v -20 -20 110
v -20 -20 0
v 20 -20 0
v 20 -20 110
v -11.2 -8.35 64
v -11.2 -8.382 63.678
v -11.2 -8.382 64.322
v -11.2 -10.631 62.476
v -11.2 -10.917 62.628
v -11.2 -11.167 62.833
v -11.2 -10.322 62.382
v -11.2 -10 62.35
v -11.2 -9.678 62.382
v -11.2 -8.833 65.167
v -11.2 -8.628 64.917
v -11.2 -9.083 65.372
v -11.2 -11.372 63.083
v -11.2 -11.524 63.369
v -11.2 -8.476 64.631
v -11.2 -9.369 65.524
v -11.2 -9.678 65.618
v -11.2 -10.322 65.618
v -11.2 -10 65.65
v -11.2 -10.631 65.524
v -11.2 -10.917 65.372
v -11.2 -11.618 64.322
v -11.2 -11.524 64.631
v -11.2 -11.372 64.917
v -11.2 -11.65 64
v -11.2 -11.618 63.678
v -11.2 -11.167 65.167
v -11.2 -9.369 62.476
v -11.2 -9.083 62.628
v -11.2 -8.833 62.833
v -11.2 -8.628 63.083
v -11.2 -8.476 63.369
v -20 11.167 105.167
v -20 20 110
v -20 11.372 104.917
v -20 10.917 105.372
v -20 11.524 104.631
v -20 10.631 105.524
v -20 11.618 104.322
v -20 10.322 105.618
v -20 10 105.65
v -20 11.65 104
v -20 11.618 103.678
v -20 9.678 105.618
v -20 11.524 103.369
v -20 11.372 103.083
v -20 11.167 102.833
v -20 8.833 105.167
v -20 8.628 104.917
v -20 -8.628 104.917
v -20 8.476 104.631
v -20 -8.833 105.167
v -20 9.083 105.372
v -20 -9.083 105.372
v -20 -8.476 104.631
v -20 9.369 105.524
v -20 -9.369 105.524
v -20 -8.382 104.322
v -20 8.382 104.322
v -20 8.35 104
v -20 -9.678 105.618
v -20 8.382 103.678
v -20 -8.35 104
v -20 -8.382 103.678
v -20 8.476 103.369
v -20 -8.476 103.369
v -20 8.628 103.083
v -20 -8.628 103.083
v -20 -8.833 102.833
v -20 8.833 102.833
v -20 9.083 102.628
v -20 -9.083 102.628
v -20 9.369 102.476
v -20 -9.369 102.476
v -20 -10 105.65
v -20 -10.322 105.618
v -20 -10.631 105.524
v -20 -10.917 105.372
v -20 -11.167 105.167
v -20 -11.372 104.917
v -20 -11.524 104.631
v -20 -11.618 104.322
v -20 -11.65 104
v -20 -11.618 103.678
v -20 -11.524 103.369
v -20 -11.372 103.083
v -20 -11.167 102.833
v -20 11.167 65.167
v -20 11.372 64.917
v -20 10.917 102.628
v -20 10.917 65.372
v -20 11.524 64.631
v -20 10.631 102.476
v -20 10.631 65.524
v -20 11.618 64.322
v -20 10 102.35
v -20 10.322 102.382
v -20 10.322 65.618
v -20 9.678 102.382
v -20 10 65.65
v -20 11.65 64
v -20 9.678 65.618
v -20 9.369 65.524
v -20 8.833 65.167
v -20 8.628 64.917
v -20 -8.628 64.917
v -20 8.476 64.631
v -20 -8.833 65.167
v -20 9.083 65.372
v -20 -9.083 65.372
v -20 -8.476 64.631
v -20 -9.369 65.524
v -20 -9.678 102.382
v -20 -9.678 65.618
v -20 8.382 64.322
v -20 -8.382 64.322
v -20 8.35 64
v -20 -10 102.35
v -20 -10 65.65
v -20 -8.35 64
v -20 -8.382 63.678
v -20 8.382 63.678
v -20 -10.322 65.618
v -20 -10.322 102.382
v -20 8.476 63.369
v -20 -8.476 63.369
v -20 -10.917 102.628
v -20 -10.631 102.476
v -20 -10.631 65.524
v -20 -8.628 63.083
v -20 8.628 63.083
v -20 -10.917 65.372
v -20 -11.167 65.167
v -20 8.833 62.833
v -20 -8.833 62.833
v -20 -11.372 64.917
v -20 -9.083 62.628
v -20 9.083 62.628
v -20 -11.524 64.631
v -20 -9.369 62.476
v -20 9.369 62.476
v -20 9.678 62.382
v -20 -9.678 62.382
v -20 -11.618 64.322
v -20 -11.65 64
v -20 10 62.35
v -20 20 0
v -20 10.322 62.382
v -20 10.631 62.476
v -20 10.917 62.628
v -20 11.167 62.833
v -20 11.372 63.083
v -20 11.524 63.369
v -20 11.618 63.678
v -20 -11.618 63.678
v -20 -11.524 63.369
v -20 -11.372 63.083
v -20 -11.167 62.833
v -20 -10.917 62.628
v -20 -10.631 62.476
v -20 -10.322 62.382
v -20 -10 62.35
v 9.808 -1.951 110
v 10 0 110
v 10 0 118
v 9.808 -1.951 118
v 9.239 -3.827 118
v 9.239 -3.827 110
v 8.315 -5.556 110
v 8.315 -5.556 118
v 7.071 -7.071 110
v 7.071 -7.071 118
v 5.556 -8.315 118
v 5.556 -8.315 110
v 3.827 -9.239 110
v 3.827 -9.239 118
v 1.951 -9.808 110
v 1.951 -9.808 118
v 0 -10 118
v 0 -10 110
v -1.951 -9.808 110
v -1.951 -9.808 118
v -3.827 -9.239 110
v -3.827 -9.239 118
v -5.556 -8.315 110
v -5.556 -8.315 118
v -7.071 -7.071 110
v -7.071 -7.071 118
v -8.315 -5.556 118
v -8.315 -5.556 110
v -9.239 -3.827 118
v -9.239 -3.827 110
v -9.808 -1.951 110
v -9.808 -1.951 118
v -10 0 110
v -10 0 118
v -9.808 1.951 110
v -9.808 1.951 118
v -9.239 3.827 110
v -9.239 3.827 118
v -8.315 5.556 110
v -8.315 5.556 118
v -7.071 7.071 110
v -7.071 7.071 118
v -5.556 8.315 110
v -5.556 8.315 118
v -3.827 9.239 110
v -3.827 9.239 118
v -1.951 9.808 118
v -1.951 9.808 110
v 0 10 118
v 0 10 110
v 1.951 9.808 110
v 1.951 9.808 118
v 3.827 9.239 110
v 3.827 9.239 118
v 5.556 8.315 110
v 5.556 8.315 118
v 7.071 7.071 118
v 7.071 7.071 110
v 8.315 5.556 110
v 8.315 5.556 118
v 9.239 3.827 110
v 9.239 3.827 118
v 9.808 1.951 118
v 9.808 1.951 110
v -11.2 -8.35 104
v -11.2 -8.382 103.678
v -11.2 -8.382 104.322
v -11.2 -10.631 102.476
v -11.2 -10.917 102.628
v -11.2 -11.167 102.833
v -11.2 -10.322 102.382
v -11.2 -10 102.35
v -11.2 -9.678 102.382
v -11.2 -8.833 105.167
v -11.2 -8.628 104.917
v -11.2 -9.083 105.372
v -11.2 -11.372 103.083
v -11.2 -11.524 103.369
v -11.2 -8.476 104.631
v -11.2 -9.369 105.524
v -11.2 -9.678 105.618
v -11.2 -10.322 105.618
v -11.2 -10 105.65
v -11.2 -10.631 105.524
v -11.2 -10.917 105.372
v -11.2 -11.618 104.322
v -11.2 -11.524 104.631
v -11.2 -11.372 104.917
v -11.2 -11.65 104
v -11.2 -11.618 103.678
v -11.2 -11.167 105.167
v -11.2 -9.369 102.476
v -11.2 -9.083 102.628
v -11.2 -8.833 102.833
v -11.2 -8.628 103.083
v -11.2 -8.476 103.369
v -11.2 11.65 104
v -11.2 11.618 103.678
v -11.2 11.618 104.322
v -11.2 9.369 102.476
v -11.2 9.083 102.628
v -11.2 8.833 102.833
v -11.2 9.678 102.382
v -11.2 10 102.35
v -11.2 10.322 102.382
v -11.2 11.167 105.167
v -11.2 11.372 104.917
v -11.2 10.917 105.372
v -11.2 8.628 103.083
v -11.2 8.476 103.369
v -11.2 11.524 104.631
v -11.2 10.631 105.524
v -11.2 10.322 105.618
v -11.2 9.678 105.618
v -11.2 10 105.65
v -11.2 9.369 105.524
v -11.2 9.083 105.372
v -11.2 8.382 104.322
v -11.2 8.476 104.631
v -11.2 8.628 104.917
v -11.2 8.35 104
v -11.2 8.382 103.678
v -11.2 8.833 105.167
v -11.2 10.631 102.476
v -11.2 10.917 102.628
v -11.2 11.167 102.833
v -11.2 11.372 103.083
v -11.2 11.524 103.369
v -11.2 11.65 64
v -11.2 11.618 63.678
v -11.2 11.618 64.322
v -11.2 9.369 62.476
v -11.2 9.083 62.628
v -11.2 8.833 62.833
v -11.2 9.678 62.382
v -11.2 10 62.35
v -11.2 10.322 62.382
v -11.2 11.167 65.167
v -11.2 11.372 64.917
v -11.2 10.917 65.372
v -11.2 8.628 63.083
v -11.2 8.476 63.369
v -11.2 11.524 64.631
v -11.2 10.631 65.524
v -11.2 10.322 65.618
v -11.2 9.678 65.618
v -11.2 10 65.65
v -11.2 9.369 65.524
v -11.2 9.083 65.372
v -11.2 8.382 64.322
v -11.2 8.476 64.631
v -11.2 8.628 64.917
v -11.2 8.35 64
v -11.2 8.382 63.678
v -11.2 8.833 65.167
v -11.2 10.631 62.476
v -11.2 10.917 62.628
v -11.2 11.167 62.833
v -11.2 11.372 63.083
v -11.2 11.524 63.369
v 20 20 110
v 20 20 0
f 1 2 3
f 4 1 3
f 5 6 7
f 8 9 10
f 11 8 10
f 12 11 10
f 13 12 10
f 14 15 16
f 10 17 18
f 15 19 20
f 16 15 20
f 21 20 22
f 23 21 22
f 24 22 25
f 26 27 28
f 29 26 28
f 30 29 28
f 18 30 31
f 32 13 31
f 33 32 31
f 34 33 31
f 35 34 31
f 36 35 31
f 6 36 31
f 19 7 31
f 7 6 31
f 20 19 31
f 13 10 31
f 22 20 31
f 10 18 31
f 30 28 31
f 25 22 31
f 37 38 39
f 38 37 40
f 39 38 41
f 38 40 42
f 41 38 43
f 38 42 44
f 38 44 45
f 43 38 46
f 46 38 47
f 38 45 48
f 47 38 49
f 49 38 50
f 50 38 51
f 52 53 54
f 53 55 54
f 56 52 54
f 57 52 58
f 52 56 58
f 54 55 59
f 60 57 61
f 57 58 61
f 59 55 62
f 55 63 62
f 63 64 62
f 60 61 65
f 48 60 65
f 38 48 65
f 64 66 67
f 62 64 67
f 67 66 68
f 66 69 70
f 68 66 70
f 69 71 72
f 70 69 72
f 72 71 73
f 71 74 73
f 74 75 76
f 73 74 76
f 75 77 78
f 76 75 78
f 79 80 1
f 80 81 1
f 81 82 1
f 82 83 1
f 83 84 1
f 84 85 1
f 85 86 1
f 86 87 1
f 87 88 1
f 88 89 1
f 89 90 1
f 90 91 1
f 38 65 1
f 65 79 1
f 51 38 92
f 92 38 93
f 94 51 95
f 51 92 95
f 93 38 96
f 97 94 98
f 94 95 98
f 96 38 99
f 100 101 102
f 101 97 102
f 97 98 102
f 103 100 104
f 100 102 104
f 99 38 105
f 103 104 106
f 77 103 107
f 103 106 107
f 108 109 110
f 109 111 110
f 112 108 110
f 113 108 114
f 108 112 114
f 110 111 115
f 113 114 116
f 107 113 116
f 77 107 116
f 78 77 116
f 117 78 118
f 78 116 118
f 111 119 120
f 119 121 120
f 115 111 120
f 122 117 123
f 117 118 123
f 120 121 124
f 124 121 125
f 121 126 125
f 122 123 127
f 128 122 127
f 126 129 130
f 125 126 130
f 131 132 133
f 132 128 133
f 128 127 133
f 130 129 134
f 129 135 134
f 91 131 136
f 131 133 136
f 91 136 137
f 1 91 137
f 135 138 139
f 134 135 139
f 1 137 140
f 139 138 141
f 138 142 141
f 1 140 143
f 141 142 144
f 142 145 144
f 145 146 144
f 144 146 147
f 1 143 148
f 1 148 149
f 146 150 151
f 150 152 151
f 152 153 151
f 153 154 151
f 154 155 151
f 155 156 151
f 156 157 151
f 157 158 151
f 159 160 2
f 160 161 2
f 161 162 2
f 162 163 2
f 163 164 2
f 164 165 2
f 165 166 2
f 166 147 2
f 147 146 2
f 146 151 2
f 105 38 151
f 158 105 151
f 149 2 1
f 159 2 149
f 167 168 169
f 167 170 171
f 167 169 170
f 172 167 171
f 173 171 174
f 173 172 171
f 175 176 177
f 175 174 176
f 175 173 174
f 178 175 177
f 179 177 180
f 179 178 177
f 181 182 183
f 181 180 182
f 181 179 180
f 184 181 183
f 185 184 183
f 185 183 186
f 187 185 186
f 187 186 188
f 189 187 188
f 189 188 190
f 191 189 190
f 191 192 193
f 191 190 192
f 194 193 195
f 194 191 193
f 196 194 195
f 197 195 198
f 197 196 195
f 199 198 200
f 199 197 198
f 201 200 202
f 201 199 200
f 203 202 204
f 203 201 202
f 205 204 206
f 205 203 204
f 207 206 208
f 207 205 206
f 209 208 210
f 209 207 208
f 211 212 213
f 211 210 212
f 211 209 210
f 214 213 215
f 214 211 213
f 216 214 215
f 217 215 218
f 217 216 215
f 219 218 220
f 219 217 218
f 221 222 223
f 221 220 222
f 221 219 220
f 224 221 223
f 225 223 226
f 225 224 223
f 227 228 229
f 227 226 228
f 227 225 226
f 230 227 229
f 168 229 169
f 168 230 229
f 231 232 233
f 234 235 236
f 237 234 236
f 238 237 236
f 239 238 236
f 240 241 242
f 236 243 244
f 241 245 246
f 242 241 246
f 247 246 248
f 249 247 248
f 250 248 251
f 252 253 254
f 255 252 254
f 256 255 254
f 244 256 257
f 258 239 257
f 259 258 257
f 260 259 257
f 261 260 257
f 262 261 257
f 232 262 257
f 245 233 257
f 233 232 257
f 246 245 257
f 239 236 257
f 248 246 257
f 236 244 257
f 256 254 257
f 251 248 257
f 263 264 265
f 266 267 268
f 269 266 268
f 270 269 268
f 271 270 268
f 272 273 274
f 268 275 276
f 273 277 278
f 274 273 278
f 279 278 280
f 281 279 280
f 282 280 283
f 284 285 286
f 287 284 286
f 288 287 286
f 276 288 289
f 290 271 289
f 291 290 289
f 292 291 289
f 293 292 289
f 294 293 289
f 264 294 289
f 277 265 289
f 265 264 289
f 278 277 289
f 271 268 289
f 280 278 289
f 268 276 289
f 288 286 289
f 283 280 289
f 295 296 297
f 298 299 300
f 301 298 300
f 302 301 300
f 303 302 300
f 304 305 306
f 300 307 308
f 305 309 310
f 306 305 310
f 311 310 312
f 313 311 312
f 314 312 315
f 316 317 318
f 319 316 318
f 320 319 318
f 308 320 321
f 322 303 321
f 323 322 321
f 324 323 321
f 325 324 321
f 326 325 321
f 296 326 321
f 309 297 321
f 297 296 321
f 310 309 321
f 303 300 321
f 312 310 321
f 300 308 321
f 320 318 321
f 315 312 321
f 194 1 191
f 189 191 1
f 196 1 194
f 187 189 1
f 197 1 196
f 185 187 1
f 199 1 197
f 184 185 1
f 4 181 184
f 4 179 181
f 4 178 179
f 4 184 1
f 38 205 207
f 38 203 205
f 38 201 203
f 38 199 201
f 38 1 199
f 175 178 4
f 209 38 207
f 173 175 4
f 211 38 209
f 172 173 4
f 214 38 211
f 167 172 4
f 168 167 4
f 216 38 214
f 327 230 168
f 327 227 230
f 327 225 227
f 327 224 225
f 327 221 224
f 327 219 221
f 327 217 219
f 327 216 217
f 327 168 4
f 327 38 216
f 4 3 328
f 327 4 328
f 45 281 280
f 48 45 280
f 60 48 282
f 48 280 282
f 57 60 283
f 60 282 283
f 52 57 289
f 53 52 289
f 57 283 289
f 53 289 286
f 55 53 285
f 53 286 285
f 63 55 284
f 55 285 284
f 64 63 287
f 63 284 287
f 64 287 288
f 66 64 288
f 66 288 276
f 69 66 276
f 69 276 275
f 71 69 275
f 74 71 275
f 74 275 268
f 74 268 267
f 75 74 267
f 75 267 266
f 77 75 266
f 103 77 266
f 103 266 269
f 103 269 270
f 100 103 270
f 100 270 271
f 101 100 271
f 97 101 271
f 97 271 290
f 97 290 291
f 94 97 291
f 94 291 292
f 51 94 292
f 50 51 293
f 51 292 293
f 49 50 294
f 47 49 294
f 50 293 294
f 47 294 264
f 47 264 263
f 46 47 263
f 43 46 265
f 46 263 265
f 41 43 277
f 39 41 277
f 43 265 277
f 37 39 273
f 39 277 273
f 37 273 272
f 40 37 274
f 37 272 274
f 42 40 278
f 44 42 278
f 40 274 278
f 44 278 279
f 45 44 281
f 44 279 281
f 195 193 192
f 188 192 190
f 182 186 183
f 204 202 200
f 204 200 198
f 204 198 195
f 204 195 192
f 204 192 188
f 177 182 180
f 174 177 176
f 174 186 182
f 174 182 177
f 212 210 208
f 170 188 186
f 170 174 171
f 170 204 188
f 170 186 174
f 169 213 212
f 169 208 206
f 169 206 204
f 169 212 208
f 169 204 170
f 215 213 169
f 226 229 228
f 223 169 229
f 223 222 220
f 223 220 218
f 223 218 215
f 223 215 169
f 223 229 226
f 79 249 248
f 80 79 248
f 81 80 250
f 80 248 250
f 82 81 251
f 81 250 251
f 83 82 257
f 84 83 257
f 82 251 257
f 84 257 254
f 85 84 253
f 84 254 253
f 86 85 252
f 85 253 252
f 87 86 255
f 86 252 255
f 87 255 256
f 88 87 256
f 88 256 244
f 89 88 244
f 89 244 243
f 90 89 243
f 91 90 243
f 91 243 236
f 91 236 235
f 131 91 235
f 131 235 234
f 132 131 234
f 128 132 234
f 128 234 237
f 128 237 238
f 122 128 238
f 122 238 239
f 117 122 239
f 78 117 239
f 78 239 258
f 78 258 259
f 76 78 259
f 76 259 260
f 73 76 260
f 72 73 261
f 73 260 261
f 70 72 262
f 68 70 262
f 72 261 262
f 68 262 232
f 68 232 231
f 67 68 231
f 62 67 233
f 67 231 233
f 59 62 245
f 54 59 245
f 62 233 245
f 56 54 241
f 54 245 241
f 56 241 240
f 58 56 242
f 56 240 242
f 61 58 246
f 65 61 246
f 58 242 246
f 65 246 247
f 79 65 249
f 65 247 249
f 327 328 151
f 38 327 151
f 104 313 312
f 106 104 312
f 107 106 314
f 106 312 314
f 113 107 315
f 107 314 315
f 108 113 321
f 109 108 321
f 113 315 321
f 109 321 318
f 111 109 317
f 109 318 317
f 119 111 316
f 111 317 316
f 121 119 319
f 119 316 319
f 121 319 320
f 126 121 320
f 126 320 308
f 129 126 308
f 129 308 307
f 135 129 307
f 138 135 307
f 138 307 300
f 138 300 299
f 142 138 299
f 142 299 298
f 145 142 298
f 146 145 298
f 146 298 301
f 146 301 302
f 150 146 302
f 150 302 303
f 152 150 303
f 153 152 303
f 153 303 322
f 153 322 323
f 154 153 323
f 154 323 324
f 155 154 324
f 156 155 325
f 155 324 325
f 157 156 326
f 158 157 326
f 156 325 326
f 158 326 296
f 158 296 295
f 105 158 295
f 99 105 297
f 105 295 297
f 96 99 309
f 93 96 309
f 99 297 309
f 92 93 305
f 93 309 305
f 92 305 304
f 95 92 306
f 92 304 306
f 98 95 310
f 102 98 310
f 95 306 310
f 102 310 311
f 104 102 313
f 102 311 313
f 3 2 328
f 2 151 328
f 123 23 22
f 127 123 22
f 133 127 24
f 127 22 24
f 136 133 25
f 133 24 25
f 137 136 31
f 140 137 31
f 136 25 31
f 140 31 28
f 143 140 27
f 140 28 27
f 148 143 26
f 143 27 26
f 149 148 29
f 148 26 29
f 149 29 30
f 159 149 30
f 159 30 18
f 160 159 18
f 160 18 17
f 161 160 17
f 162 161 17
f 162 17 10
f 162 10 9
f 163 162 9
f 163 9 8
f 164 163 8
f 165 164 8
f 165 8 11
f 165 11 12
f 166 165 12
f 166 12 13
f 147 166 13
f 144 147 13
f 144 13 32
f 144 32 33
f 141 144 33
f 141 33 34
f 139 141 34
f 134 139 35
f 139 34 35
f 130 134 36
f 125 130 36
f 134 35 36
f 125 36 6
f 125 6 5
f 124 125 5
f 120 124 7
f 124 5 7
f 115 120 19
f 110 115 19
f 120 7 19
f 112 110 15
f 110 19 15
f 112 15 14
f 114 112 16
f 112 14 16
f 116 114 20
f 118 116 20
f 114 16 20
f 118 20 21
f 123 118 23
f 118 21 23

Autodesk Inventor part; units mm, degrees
ref_plane "YZ Plane" through (0, 0, 0) normal (1, 0, 0) x (0, 1, 0)
ref_plane "XZ Plane" through (0, 0, 0) normal (0, 1, 0) x (-1, 0, 0)
ref_plane "XY Plane" through (0, 0, 0) normal (0, 0, 1) x (1, 0, 0)
sketch "スケッチ1" plane through (0, 0, 0) normal (0, 0, 1) x (1, 0, 0)
  line L0 (-20, -20) -> (20, -20)
  line L1 (20, -20) -> (20, 20)
  line L2 (20, 20) -> (-20, 20)
  line L3 (-20, 20) -> (-20, -20)
  line L4 (-20, -20) -> (20, 20) construction
  line L5 (20, -20) -> (-20, 20) construction
  point P0 (0, 0)
  dimension "d0" = 40
  dimension "d1" = 40
extrude "押し出し1" add sketch "スケッチ1" along normal blind 110
sketch "スケッチ2" plane through (0, 0, 110) normal (0, 0, 1) x (1, 0, 0)
  circle A0 centre (0, 0) radius 10
  dimension "d4" = 20
extrude "押し出し2" add sketch "スケッチ2" along normal blind 8
sketch "スケッチ3" plane through (-20, -20, 0) normal (-1, 0, 0) x (0, 0, 1)
  line L0 (0, 40) -> (0, 0) projected
  line L1 (0, 0) -> (110, 0) projected
  line L2 (110, 40) -> (110, 0) projected
  line L3 (0, 40) -> (110, 40) projected
  line L4 (64, 10) -> (104, 10)
  line L5 (104, 10) -> (104, 30)
  line L6 (104, 30) -> (64, 30)
  line L7 (64, 30) -> (64, 10)
  line L8 (64, 10) -> (104, 30) construction
  line L9 (104, 10) -> (64, 30) construction
  point P0 (0, 20)
  point P1 (84, 20)
  point P2 (0, 20)
  point P3 (84, 20)
  dimension "d7" = 20
  dimension "d8" = 40
  dimension "d9" = 6
hole "穴1" at (-20, 10, 64) at (-20, -10, 64) at (-20, -10, 104) at (-20, 10, 104) direction (1, 0, 0) diameter 3.3 depth 8.8
properties part number "Diode_Laser"
